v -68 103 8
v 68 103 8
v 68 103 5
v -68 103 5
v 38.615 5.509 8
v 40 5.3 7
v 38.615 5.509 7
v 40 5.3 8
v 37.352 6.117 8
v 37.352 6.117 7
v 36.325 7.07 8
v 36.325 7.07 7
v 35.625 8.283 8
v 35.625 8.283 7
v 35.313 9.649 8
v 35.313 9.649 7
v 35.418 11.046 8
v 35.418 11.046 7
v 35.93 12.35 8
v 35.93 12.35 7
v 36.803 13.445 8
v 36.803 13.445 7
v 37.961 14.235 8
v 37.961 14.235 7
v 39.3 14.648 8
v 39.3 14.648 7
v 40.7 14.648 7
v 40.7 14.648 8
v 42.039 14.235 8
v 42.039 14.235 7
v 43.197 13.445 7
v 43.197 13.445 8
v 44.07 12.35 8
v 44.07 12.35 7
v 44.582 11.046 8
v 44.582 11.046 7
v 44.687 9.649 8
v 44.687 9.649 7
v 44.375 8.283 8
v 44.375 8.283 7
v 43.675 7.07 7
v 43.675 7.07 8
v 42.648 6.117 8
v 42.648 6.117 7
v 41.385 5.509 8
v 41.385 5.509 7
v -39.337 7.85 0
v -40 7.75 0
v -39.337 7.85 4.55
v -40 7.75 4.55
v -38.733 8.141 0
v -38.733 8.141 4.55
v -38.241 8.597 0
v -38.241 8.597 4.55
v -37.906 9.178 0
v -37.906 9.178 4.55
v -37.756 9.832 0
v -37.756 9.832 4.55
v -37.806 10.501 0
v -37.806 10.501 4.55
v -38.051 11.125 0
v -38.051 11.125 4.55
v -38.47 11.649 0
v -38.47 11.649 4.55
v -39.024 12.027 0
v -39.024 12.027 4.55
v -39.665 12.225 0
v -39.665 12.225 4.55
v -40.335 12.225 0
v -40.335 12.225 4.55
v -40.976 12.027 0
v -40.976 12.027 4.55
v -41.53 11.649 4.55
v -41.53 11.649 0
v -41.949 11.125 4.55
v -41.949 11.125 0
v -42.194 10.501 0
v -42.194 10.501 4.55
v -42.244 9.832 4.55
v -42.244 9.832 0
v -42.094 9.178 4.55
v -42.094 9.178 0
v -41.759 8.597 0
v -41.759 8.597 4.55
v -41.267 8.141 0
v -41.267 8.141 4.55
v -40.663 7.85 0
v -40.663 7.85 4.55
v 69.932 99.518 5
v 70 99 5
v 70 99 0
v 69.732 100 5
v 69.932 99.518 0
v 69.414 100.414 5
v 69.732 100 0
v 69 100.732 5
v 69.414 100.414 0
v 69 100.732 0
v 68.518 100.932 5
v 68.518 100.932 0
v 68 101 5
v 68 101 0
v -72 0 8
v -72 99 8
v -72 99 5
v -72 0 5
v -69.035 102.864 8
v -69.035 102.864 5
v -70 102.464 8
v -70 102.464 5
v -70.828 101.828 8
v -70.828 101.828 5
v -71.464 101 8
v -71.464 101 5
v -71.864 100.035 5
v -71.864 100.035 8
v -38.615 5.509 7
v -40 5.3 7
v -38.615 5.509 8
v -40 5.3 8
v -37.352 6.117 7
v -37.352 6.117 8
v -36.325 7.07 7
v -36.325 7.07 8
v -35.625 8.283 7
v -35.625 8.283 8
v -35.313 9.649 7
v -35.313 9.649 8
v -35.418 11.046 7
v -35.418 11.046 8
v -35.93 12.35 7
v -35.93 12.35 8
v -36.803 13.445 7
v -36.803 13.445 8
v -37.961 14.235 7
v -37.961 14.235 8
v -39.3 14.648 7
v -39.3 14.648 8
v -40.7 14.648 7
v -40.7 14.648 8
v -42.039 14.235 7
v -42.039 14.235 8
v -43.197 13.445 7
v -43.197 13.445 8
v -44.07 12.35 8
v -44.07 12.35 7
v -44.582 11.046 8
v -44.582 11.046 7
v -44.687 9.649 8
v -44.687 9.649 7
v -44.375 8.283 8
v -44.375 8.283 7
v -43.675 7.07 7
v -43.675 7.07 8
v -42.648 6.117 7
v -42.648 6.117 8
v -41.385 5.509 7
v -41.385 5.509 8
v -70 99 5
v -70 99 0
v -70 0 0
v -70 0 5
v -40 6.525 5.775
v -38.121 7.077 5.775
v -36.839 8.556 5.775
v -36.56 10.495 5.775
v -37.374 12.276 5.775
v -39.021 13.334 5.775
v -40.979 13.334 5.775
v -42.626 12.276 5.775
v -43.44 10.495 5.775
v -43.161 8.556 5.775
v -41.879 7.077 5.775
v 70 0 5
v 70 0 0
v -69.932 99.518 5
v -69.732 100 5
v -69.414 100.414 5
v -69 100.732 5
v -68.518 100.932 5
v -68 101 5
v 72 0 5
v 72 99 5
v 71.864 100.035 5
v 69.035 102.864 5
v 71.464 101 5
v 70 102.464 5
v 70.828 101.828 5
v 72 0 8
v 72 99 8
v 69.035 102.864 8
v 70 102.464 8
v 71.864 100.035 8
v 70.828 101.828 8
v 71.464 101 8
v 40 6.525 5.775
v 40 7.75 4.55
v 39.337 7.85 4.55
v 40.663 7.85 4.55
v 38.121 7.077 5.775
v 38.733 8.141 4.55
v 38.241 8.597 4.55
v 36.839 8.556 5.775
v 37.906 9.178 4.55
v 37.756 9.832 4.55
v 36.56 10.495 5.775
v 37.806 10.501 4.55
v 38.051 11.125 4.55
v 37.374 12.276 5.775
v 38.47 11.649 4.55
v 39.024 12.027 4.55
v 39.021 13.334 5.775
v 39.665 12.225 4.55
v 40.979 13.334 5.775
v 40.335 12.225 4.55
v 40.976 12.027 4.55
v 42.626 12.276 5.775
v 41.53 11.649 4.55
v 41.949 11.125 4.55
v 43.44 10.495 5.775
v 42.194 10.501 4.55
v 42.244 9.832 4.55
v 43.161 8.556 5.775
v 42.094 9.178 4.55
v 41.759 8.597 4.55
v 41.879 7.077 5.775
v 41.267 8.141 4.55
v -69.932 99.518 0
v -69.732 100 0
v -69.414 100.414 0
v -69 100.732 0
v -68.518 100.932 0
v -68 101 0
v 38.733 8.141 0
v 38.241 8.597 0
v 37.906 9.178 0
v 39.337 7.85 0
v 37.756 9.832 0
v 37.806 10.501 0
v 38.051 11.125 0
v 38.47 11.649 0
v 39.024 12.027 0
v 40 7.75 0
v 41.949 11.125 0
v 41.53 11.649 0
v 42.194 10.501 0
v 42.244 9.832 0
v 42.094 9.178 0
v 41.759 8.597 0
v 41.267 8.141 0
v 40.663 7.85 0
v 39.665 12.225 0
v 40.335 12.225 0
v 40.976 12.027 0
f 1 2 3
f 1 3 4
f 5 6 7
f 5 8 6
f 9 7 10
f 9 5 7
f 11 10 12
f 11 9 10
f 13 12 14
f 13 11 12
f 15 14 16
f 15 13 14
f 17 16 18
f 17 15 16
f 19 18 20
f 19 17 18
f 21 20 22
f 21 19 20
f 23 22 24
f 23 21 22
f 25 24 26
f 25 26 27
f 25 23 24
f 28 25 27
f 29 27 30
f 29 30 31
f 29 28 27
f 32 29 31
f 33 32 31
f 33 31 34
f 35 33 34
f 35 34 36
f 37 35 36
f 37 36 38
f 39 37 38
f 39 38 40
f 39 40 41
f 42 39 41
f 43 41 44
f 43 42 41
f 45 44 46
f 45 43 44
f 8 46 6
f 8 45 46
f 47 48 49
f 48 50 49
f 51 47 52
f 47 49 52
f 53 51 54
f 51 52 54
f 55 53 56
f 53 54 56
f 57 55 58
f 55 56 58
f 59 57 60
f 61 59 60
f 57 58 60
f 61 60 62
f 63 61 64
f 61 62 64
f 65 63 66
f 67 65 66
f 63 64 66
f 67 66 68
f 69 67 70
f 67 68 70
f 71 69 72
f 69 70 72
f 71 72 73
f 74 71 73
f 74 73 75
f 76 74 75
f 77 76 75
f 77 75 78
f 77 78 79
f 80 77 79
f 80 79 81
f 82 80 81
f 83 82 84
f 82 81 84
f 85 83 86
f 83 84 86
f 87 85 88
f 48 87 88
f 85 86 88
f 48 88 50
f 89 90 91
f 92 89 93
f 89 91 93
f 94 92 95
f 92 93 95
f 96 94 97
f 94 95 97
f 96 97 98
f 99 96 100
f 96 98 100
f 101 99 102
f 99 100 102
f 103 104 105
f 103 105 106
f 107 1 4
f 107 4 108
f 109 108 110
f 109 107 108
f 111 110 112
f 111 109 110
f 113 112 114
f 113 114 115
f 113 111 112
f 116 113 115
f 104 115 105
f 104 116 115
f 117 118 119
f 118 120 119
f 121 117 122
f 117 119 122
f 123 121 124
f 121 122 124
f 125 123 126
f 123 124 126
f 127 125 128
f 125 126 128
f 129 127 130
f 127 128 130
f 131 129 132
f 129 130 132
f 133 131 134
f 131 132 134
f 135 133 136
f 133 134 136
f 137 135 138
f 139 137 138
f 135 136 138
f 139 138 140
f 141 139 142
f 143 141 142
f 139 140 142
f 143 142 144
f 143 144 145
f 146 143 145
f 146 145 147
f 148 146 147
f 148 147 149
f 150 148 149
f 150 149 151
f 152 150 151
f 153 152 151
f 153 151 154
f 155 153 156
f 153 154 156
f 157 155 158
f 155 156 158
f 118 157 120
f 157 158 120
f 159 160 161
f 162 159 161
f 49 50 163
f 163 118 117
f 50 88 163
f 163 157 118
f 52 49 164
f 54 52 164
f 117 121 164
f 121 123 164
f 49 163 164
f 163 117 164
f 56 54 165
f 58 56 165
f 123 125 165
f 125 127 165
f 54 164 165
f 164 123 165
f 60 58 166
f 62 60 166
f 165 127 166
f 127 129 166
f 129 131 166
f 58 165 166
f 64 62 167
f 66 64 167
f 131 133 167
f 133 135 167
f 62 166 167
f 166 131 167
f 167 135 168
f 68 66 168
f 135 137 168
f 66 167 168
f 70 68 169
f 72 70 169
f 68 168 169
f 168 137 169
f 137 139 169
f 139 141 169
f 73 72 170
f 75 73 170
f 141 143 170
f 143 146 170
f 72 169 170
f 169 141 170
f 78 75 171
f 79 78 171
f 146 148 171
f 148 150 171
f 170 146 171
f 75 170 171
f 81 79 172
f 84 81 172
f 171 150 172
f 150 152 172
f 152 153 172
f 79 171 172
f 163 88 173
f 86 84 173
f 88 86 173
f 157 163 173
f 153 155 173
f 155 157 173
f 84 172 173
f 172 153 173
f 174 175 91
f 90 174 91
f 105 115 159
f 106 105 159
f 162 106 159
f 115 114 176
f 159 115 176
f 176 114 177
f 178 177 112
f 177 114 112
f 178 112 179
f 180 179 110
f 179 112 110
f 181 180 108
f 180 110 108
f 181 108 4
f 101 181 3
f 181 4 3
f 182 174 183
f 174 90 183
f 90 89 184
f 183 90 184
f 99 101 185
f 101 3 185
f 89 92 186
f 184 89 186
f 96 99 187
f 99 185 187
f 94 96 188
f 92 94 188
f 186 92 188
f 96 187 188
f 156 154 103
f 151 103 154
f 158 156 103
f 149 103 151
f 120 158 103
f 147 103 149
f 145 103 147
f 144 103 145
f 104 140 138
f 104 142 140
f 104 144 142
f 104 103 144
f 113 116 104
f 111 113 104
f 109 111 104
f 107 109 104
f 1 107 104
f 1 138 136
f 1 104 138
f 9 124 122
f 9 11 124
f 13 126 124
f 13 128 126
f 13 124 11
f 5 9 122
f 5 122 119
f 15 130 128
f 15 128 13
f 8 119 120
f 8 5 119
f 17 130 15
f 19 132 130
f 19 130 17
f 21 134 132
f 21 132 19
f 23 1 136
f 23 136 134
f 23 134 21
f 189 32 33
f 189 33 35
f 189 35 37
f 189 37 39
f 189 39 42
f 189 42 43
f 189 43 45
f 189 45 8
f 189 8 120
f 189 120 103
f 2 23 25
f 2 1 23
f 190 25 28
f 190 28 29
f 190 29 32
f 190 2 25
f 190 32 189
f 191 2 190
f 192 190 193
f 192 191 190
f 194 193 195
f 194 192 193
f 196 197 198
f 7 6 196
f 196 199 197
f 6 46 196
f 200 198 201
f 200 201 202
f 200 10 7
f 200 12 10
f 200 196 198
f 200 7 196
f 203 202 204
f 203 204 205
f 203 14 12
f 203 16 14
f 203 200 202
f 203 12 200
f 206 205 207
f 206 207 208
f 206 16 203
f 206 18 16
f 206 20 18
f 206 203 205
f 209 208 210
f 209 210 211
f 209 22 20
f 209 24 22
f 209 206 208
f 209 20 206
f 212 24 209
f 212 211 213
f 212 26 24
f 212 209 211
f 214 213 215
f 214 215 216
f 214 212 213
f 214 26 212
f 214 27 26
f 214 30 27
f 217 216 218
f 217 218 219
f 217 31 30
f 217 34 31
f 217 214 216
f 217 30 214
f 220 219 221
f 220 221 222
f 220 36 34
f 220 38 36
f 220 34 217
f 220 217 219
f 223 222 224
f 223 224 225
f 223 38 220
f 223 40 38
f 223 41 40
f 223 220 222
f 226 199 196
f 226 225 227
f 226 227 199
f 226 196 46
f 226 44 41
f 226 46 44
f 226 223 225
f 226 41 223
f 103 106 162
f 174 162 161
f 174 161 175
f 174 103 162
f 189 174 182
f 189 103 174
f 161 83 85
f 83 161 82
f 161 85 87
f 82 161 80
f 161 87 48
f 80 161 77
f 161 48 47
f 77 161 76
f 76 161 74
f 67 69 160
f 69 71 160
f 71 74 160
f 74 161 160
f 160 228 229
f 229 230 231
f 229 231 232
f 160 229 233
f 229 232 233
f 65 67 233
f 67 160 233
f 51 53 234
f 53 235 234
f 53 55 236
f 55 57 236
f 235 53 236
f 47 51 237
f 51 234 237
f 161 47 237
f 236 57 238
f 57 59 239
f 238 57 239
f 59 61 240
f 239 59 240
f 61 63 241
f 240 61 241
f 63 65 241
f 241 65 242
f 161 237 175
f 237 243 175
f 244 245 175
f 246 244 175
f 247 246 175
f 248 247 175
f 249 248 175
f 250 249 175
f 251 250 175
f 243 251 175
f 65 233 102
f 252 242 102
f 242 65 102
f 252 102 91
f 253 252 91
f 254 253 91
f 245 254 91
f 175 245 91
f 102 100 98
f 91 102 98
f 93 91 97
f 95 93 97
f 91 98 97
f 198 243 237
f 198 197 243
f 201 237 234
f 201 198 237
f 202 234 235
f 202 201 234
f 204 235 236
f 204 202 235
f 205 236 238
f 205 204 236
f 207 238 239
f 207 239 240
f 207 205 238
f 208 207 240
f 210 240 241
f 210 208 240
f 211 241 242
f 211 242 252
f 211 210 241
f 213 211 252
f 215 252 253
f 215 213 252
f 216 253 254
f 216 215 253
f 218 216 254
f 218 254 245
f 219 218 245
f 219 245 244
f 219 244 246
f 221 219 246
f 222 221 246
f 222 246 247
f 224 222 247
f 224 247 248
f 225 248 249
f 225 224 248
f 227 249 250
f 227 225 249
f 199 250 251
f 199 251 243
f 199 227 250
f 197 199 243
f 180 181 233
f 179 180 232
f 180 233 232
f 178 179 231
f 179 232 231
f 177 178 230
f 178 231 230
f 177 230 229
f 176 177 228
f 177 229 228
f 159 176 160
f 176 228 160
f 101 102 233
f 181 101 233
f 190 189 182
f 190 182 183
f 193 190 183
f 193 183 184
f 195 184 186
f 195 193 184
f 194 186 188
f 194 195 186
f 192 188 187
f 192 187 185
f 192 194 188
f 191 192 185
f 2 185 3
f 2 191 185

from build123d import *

# Parameters (mm, degrees)
BOSS_EXTRUDE1_DEPTH = 8
BOSS_EXTRUDE2_DEPTH = 3


with BuildPart() as part:
    # Sketch1 → Boss-Extrude1 (new body)
    with BuildSketch(Plane.XY):
        with BuildLine():
            Line((70, 0), (70, 99))
            ThreePointArc((70, 99), (69.414213562, 100.414213562), (68, 101))
            Line((68, 101), (-68, 101))
            ThreePointArc((-68, 101), (-69.414213562, 100.414213562), (-70, 99))
            Line((-70, 99), (-70, 0))
            Line((-70, 0), (70, 0))
        make_face()
    extrude(amount=BOSS_EXTRUDE1_DEPTH)

    # Sketch2 → Boss-Extrude2 (add)
    with BuildSketch(Plane.XY.offset(8)):
        with BuildLine():
            Line((72, 0), (72, 99))
            ThreePointArc((72, 99), (70.828427125, 101.828427125), (68, 103))
            Line((68, 103), (-68, 103))
            ThreePointArc((-68, 103), (-70.828427125, 101.828427125), (-72, 99))
            Line((-72, 99), (-72, 0))
            Line((-72, 0), (72, 0))
        make_face()
    extrude(amount=-BOSS_EXTRUDE2_DEPTH)

    # Sketch3 → CSK for M4 Countersunk Flat Head Screw1 (revolve, cut)
    with BuildSketch(Plane(origin=(40, 10, 8), x_dir=(0, -1, 0), z_dir=(1, 0, 0))):
        Polygon((0, 0), (0, 8), (2.25, 8), (2.25, 3.45), (4.7, 1), (4.7, 0), align=None)
    csk_for_m4_countersunk_flat_head_screw1 = revolve(axis=Axis((40, 10, 14.35), (0, 0, -1)), mode=Mode.SUBTRACT)

    # Mirror1: CSK for M4 Countersunk Flat Head Screw1 across plane
    add(csk_for_m4_countersunk_flat_head_screw1.mirror(Plane(origin=(0, 0, 0), x_dir=(0, 0, 1), z_dir=(1, 0, 0))), mode=Mode.SUBTRACT)


solid = part.part
